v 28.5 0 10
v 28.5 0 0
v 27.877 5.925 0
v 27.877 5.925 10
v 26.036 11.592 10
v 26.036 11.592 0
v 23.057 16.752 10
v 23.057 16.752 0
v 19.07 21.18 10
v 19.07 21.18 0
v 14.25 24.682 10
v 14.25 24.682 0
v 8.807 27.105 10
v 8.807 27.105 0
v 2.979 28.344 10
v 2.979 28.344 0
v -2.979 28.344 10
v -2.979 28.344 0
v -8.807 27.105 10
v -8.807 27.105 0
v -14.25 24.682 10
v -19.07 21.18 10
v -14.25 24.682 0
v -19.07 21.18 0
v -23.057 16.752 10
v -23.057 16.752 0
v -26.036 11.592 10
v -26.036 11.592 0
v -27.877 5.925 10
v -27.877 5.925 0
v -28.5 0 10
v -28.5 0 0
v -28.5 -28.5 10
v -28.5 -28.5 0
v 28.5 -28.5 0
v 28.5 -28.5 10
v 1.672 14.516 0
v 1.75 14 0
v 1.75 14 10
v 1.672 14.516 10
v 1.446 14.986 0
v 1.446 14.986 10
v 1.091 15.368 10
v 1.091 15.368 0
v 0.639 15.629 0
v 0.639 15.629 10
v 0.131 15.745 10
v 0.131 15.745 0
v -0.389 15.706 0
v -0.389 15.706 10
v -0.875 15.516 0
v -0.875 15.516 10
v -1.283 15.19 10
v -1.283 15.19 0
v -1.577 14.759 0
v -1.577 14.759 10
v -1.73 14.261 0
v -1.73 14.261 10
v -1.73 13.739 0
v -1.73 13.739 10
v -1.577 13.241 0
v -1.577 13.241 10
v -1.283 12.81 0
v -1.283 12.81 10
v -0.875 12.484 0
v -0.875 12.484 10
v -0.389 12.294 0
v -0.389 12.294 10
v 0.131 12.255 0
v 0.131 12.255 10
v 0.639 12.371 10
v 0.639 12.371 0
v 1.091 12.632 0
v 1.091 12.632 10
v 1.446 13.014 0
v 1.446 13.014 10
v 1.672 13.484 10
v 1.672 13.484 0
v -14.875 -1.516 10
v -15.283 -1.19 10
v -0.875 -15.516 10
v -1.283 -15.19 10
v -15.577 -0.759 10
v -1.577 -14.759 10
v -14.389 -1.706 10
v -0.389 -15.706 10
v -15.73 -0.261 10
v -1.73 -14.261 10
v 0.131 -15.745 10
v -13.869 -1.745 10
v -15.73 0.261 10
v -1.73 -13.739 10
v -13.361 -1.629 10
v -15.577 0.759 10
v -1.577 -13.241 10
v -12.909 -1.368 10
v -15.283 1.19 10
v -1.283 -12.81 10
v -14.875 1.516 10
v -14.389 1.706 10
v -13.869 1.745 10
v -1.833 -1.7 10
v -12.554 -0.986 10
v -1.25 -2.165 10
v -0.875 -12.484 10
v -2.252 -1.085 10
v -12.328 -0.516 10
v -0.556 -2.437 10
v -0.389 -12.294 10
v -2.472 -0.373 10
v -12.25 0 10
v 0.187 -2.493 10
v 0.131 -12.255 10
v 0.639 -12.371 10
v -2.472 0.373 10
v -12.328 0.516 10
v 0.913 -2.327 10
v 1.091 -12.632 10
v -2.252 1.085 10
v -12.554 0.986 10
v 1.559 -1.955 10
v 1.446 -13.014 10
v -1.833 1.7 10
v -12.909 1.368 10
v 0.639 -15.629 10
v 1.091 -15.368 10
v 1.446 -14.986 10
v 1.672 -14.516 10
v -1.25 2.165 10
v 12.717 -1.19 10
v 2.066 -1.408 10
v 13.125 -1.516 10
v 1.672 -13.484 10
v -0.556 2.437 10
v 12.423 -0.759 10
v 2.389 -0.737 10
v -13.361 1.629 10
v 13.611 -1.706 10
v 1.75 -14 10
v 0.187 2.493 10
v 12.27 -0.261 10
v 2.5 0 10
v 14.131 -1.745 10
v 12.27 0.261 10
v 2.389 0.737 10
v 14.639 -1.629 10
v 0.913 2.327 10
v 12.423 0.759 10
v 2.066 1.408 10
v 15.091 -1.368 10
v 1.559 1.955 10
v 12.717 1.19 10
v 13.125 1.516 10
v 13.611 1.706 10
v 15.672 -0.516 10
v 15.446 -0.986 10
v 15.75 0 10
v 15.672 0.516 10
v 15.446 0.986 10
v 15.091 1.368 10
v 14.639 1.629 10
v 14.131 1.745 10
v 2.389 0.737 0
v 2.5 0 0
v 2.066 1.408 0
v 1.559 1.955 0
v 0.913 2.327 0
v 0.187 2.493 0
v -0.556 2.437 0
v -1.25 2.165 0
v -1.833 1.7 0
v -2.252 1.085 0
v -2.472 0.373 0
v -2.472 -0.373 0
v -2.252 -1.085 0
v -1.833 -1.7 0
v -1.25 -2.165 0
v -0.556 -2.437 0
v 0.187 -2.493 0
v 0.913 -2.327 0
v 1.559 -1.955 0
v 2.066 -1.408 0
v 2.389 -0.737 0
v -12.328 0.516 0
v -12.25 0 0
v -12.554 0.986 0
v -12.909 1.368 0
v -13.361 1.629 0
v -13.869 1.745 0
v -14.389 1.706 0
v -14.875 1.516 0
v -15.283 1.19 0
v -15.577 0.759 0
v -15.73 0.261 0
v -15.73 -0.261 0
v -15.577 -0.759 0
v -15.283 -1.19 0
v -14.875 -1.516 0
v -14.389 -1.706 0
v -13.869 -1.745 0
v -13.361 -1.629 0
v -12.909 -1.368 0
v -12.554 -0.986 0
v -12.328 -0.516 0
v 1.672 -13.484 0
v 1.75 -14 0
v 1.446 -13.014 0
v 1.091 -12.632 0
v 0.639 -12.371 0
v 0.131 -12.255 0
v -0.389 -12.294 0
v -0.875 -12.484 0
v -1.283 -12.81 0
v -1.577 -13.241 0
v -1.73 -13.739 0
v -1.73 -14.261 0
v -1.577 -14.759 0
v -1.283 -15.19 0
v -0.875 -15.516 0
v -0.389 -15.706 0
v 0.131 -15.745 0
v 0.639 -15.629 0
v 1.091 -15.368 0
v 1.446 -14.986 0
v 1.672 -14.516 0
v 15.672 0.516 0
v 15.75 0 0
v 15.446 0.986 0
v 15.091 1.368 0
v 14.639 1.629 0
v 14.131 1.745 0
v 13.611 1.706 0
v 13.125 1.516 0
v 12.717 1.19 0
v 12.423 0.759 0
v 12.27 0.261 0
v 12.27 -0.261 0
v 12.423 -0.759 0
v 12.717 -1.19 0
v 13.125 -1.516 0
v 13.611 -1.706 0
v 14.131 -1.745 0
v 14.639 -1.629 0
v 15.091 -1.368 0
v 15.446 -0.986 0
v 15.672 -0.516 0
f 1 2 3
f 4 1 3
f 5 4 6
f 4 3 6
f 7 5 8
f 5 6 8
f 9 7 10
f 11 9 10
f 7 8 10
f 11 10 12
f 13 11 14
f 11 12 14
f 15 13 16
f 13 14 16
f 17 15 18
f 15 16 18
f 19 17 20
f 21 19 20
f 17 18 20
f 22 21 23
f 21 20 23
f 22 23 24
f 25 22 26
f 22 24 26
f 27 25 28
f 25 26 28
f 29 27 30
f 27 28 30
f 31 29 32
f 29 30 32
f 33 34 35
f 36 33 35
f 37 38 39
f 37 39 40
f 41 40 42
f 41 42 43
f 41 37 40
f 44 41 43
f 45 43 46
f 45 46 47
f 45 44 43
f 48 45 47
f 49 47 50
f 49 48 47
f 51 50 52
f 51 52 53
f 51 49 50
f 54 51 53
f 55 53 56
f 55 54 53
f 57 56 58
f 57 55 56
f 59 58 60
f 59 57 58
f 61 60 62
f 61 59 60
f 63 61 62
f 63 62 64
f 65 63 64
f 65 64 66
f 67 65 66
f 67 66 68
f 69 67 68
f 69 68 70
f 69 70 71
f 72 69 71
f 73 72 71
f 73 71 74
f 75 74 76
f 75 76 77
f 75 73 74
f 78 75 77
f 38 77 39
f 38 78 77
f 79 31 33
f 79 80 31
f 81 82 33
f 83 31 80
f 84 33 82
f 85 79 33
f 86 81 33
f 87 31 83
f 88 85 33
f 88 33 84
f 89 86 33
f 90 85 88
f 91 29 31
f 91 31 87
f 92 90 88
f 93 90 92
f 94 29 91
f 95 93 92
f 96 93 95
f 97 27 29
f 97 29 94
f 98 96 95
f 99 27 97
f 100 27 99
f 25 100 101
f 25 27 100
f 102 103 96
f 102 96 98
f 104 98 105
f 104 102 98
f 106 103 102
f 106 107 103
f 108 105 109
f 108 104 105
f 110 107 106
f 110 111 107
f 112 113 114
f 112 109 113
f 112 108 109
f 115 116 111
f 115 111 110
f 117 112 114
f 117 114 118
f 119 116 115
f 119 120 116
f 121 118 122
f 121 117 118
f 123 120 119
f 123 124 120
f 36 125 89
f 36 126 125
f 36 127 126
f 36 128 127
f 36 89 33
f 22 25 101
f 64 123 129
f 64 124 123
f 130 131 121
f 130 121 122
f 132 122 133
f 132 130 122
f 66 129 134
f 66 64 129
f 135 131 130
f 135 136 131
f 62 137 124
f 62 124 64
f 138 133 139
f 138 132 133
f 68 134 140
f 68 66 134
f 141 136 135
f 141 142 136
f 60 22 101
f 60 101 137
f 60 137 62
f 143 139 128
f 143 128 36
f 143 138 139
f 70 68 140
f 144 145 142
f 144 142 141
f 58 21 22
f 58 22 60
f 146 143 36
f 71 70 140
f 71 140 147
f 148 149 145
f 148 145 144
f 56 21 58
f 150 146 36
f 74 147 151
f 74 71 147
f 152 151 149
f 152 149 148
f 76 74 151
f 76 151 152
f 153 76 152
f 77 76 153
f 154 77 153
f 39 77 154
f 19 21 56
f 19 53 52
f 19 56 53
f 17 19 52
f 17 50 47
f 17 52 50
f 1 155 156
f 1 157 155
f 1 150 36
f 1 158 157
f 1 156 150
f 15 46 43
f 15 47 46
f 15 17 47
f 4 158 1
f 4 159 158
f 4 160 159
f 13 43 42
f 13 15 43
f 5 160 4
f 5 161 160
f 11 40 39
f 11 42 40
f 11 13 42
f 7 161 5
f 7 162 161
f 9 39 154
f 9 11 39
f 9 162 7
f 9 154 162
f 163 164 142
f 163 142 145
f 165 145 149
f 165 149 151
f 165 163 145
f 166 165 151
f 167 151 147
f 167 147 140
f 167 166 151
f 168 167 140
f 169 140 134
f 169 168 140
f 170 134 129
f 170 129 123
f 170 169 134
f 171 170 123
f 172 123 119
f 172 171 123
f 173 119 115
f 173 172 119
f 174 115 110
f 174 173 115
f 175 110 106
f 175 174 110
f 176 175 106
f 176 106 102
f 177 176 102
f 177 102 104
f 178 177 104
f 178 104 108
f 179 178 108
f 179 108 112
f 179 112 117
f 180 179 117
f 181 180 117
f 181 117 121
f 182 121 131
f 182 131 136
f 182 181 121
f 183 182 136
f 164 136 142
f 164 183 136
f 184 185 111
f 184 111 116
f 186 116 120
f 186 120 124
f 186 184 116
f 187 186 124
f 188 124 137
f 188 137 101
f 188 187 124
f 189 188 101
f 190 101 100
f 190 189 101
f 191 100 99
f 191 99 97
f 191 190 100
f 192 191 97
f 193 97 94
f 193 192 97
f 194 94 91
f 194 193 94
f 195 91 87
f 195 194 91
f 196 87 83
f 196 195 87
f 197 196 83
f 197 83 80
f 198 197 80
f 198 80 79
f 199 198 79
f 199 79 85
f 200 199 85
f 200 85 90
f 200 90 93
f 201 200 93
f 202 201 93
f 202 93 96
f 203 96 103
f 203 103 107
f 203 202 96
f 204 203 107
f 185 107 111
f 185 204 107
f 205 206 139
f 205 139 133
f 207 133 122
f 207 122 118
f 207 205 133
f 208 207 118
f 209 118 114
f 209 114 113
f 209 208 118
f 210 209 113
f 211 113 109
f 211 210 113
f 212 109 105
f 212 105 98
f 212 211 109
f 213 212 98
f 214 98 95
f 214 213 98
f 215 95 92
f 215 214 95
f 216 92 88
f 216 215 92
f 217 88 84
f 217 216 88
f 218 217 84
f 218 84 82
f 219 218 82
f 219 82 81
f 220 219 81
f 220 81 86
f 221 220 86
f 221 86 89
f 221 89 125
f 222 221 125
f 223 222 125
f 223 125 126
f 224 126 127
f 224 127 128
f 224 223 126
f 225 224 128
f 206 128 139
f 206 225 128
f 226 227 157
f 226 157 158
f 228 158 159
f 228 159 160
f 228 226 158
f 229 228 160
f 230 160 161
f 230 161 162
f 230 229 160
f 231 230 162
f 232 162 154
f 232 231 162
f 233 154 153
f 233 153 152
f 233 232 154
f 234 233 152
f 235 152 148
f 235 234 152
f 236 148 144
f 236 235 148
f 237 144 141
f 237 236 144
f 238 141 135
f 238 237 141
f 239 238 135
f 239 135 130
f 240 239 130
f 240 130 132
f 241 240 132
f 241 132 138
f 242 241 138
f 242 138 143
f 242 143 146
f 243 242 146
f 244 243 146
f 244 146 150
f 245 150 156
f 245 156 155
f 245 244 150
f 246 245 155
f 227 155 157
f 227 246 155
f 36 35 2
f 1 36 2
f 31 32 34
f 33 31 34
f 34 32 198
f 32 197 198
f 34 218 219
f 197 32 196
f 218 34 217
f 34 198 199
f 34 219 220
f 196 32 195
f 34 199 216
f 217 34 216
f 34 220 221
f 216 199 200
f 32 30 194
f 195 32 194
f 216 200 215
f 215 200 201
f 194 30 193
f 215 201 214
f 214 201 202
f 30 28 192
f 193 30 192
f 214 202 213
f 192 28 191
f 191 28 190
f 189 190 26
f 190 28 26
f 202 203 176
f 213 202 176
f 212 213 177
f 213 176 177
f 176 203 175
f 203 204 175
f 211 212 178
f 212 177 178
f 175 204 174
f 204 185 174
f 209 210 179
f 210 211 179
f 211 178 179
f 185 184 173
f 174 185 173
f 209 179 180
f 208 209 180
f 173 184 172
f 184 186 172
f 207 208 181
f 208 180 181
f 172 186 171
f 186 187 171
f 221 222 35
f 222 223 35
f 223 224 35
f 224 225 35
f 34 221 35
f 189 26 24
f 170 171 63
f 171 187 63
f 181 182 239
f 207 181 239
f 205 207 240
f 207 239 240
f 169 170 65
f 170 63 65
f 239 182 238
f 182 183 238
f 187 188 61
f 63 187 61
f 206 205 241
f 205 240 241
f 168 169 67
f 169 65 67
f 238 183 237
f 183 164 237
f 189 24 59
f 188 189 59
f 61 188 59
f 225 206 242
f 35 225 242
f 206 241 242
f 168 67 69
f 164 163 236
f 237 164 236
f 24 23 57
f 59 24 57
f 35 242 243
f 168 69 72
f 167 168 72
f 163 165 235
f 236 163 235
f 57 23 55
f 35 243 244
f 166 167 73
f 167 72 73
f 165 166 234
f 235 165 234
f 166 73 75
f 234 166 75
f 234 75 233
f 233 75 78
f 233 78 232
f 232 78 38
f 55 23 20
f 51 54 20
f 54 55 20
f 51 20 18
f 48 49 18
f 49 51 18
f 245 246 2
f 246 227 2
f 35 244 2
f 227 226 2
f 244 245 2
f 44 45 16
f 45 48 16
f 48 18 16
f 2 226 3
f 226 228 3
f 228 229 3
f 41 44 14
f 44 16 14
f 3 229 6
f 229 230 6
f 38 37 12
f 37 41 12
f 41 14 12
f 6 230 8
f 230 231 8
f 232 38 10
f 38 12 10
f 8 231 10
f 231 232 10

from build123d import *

# Parameters (mm, degrees)
SKETCH_1_R      = 1.75
SKETCH_1_R_2    = 2.5
EXTRUDE_1_DEPTH = 10


with BuildPart() as part:
    # Эскиз1 → Бобышка-Вытянуть1 (new body)
    with BuildSketch(Plane.XY):
        with BuildLine():
            Line((-28.5, 0), (-28.5, -28.5))
            Line((-28.5, -28.5), (28.5, -28.5))
            Line((28.5, -28.5), (28.5, 0))
            ThreePointArc((28.5, 0), (0, 28.5), (-28.5, 0))
        make_face()
        with Locations((0, 14)):
            Circle(SKETCH_1_R, mode=Mode.SUBTRACT)
        with Locations((14, 0)):
            Circle(SKETCH_1_R, mode=Mode.SUBTRACT)
        with Locations((0, -14)):
            Circle(SKETCH_1_R, mode=Mode.SUBTRACT)
        with Locations((-14, 0)):
            Circle(SKETCH_1_R, mode=Mode.SUBTRACT)
        Circle(SKETCH_1_R_2, mode=Mode.SUBTRACT)
    extrude(amount=EXTRUDE_1_DEPTH)


solid = part.part
